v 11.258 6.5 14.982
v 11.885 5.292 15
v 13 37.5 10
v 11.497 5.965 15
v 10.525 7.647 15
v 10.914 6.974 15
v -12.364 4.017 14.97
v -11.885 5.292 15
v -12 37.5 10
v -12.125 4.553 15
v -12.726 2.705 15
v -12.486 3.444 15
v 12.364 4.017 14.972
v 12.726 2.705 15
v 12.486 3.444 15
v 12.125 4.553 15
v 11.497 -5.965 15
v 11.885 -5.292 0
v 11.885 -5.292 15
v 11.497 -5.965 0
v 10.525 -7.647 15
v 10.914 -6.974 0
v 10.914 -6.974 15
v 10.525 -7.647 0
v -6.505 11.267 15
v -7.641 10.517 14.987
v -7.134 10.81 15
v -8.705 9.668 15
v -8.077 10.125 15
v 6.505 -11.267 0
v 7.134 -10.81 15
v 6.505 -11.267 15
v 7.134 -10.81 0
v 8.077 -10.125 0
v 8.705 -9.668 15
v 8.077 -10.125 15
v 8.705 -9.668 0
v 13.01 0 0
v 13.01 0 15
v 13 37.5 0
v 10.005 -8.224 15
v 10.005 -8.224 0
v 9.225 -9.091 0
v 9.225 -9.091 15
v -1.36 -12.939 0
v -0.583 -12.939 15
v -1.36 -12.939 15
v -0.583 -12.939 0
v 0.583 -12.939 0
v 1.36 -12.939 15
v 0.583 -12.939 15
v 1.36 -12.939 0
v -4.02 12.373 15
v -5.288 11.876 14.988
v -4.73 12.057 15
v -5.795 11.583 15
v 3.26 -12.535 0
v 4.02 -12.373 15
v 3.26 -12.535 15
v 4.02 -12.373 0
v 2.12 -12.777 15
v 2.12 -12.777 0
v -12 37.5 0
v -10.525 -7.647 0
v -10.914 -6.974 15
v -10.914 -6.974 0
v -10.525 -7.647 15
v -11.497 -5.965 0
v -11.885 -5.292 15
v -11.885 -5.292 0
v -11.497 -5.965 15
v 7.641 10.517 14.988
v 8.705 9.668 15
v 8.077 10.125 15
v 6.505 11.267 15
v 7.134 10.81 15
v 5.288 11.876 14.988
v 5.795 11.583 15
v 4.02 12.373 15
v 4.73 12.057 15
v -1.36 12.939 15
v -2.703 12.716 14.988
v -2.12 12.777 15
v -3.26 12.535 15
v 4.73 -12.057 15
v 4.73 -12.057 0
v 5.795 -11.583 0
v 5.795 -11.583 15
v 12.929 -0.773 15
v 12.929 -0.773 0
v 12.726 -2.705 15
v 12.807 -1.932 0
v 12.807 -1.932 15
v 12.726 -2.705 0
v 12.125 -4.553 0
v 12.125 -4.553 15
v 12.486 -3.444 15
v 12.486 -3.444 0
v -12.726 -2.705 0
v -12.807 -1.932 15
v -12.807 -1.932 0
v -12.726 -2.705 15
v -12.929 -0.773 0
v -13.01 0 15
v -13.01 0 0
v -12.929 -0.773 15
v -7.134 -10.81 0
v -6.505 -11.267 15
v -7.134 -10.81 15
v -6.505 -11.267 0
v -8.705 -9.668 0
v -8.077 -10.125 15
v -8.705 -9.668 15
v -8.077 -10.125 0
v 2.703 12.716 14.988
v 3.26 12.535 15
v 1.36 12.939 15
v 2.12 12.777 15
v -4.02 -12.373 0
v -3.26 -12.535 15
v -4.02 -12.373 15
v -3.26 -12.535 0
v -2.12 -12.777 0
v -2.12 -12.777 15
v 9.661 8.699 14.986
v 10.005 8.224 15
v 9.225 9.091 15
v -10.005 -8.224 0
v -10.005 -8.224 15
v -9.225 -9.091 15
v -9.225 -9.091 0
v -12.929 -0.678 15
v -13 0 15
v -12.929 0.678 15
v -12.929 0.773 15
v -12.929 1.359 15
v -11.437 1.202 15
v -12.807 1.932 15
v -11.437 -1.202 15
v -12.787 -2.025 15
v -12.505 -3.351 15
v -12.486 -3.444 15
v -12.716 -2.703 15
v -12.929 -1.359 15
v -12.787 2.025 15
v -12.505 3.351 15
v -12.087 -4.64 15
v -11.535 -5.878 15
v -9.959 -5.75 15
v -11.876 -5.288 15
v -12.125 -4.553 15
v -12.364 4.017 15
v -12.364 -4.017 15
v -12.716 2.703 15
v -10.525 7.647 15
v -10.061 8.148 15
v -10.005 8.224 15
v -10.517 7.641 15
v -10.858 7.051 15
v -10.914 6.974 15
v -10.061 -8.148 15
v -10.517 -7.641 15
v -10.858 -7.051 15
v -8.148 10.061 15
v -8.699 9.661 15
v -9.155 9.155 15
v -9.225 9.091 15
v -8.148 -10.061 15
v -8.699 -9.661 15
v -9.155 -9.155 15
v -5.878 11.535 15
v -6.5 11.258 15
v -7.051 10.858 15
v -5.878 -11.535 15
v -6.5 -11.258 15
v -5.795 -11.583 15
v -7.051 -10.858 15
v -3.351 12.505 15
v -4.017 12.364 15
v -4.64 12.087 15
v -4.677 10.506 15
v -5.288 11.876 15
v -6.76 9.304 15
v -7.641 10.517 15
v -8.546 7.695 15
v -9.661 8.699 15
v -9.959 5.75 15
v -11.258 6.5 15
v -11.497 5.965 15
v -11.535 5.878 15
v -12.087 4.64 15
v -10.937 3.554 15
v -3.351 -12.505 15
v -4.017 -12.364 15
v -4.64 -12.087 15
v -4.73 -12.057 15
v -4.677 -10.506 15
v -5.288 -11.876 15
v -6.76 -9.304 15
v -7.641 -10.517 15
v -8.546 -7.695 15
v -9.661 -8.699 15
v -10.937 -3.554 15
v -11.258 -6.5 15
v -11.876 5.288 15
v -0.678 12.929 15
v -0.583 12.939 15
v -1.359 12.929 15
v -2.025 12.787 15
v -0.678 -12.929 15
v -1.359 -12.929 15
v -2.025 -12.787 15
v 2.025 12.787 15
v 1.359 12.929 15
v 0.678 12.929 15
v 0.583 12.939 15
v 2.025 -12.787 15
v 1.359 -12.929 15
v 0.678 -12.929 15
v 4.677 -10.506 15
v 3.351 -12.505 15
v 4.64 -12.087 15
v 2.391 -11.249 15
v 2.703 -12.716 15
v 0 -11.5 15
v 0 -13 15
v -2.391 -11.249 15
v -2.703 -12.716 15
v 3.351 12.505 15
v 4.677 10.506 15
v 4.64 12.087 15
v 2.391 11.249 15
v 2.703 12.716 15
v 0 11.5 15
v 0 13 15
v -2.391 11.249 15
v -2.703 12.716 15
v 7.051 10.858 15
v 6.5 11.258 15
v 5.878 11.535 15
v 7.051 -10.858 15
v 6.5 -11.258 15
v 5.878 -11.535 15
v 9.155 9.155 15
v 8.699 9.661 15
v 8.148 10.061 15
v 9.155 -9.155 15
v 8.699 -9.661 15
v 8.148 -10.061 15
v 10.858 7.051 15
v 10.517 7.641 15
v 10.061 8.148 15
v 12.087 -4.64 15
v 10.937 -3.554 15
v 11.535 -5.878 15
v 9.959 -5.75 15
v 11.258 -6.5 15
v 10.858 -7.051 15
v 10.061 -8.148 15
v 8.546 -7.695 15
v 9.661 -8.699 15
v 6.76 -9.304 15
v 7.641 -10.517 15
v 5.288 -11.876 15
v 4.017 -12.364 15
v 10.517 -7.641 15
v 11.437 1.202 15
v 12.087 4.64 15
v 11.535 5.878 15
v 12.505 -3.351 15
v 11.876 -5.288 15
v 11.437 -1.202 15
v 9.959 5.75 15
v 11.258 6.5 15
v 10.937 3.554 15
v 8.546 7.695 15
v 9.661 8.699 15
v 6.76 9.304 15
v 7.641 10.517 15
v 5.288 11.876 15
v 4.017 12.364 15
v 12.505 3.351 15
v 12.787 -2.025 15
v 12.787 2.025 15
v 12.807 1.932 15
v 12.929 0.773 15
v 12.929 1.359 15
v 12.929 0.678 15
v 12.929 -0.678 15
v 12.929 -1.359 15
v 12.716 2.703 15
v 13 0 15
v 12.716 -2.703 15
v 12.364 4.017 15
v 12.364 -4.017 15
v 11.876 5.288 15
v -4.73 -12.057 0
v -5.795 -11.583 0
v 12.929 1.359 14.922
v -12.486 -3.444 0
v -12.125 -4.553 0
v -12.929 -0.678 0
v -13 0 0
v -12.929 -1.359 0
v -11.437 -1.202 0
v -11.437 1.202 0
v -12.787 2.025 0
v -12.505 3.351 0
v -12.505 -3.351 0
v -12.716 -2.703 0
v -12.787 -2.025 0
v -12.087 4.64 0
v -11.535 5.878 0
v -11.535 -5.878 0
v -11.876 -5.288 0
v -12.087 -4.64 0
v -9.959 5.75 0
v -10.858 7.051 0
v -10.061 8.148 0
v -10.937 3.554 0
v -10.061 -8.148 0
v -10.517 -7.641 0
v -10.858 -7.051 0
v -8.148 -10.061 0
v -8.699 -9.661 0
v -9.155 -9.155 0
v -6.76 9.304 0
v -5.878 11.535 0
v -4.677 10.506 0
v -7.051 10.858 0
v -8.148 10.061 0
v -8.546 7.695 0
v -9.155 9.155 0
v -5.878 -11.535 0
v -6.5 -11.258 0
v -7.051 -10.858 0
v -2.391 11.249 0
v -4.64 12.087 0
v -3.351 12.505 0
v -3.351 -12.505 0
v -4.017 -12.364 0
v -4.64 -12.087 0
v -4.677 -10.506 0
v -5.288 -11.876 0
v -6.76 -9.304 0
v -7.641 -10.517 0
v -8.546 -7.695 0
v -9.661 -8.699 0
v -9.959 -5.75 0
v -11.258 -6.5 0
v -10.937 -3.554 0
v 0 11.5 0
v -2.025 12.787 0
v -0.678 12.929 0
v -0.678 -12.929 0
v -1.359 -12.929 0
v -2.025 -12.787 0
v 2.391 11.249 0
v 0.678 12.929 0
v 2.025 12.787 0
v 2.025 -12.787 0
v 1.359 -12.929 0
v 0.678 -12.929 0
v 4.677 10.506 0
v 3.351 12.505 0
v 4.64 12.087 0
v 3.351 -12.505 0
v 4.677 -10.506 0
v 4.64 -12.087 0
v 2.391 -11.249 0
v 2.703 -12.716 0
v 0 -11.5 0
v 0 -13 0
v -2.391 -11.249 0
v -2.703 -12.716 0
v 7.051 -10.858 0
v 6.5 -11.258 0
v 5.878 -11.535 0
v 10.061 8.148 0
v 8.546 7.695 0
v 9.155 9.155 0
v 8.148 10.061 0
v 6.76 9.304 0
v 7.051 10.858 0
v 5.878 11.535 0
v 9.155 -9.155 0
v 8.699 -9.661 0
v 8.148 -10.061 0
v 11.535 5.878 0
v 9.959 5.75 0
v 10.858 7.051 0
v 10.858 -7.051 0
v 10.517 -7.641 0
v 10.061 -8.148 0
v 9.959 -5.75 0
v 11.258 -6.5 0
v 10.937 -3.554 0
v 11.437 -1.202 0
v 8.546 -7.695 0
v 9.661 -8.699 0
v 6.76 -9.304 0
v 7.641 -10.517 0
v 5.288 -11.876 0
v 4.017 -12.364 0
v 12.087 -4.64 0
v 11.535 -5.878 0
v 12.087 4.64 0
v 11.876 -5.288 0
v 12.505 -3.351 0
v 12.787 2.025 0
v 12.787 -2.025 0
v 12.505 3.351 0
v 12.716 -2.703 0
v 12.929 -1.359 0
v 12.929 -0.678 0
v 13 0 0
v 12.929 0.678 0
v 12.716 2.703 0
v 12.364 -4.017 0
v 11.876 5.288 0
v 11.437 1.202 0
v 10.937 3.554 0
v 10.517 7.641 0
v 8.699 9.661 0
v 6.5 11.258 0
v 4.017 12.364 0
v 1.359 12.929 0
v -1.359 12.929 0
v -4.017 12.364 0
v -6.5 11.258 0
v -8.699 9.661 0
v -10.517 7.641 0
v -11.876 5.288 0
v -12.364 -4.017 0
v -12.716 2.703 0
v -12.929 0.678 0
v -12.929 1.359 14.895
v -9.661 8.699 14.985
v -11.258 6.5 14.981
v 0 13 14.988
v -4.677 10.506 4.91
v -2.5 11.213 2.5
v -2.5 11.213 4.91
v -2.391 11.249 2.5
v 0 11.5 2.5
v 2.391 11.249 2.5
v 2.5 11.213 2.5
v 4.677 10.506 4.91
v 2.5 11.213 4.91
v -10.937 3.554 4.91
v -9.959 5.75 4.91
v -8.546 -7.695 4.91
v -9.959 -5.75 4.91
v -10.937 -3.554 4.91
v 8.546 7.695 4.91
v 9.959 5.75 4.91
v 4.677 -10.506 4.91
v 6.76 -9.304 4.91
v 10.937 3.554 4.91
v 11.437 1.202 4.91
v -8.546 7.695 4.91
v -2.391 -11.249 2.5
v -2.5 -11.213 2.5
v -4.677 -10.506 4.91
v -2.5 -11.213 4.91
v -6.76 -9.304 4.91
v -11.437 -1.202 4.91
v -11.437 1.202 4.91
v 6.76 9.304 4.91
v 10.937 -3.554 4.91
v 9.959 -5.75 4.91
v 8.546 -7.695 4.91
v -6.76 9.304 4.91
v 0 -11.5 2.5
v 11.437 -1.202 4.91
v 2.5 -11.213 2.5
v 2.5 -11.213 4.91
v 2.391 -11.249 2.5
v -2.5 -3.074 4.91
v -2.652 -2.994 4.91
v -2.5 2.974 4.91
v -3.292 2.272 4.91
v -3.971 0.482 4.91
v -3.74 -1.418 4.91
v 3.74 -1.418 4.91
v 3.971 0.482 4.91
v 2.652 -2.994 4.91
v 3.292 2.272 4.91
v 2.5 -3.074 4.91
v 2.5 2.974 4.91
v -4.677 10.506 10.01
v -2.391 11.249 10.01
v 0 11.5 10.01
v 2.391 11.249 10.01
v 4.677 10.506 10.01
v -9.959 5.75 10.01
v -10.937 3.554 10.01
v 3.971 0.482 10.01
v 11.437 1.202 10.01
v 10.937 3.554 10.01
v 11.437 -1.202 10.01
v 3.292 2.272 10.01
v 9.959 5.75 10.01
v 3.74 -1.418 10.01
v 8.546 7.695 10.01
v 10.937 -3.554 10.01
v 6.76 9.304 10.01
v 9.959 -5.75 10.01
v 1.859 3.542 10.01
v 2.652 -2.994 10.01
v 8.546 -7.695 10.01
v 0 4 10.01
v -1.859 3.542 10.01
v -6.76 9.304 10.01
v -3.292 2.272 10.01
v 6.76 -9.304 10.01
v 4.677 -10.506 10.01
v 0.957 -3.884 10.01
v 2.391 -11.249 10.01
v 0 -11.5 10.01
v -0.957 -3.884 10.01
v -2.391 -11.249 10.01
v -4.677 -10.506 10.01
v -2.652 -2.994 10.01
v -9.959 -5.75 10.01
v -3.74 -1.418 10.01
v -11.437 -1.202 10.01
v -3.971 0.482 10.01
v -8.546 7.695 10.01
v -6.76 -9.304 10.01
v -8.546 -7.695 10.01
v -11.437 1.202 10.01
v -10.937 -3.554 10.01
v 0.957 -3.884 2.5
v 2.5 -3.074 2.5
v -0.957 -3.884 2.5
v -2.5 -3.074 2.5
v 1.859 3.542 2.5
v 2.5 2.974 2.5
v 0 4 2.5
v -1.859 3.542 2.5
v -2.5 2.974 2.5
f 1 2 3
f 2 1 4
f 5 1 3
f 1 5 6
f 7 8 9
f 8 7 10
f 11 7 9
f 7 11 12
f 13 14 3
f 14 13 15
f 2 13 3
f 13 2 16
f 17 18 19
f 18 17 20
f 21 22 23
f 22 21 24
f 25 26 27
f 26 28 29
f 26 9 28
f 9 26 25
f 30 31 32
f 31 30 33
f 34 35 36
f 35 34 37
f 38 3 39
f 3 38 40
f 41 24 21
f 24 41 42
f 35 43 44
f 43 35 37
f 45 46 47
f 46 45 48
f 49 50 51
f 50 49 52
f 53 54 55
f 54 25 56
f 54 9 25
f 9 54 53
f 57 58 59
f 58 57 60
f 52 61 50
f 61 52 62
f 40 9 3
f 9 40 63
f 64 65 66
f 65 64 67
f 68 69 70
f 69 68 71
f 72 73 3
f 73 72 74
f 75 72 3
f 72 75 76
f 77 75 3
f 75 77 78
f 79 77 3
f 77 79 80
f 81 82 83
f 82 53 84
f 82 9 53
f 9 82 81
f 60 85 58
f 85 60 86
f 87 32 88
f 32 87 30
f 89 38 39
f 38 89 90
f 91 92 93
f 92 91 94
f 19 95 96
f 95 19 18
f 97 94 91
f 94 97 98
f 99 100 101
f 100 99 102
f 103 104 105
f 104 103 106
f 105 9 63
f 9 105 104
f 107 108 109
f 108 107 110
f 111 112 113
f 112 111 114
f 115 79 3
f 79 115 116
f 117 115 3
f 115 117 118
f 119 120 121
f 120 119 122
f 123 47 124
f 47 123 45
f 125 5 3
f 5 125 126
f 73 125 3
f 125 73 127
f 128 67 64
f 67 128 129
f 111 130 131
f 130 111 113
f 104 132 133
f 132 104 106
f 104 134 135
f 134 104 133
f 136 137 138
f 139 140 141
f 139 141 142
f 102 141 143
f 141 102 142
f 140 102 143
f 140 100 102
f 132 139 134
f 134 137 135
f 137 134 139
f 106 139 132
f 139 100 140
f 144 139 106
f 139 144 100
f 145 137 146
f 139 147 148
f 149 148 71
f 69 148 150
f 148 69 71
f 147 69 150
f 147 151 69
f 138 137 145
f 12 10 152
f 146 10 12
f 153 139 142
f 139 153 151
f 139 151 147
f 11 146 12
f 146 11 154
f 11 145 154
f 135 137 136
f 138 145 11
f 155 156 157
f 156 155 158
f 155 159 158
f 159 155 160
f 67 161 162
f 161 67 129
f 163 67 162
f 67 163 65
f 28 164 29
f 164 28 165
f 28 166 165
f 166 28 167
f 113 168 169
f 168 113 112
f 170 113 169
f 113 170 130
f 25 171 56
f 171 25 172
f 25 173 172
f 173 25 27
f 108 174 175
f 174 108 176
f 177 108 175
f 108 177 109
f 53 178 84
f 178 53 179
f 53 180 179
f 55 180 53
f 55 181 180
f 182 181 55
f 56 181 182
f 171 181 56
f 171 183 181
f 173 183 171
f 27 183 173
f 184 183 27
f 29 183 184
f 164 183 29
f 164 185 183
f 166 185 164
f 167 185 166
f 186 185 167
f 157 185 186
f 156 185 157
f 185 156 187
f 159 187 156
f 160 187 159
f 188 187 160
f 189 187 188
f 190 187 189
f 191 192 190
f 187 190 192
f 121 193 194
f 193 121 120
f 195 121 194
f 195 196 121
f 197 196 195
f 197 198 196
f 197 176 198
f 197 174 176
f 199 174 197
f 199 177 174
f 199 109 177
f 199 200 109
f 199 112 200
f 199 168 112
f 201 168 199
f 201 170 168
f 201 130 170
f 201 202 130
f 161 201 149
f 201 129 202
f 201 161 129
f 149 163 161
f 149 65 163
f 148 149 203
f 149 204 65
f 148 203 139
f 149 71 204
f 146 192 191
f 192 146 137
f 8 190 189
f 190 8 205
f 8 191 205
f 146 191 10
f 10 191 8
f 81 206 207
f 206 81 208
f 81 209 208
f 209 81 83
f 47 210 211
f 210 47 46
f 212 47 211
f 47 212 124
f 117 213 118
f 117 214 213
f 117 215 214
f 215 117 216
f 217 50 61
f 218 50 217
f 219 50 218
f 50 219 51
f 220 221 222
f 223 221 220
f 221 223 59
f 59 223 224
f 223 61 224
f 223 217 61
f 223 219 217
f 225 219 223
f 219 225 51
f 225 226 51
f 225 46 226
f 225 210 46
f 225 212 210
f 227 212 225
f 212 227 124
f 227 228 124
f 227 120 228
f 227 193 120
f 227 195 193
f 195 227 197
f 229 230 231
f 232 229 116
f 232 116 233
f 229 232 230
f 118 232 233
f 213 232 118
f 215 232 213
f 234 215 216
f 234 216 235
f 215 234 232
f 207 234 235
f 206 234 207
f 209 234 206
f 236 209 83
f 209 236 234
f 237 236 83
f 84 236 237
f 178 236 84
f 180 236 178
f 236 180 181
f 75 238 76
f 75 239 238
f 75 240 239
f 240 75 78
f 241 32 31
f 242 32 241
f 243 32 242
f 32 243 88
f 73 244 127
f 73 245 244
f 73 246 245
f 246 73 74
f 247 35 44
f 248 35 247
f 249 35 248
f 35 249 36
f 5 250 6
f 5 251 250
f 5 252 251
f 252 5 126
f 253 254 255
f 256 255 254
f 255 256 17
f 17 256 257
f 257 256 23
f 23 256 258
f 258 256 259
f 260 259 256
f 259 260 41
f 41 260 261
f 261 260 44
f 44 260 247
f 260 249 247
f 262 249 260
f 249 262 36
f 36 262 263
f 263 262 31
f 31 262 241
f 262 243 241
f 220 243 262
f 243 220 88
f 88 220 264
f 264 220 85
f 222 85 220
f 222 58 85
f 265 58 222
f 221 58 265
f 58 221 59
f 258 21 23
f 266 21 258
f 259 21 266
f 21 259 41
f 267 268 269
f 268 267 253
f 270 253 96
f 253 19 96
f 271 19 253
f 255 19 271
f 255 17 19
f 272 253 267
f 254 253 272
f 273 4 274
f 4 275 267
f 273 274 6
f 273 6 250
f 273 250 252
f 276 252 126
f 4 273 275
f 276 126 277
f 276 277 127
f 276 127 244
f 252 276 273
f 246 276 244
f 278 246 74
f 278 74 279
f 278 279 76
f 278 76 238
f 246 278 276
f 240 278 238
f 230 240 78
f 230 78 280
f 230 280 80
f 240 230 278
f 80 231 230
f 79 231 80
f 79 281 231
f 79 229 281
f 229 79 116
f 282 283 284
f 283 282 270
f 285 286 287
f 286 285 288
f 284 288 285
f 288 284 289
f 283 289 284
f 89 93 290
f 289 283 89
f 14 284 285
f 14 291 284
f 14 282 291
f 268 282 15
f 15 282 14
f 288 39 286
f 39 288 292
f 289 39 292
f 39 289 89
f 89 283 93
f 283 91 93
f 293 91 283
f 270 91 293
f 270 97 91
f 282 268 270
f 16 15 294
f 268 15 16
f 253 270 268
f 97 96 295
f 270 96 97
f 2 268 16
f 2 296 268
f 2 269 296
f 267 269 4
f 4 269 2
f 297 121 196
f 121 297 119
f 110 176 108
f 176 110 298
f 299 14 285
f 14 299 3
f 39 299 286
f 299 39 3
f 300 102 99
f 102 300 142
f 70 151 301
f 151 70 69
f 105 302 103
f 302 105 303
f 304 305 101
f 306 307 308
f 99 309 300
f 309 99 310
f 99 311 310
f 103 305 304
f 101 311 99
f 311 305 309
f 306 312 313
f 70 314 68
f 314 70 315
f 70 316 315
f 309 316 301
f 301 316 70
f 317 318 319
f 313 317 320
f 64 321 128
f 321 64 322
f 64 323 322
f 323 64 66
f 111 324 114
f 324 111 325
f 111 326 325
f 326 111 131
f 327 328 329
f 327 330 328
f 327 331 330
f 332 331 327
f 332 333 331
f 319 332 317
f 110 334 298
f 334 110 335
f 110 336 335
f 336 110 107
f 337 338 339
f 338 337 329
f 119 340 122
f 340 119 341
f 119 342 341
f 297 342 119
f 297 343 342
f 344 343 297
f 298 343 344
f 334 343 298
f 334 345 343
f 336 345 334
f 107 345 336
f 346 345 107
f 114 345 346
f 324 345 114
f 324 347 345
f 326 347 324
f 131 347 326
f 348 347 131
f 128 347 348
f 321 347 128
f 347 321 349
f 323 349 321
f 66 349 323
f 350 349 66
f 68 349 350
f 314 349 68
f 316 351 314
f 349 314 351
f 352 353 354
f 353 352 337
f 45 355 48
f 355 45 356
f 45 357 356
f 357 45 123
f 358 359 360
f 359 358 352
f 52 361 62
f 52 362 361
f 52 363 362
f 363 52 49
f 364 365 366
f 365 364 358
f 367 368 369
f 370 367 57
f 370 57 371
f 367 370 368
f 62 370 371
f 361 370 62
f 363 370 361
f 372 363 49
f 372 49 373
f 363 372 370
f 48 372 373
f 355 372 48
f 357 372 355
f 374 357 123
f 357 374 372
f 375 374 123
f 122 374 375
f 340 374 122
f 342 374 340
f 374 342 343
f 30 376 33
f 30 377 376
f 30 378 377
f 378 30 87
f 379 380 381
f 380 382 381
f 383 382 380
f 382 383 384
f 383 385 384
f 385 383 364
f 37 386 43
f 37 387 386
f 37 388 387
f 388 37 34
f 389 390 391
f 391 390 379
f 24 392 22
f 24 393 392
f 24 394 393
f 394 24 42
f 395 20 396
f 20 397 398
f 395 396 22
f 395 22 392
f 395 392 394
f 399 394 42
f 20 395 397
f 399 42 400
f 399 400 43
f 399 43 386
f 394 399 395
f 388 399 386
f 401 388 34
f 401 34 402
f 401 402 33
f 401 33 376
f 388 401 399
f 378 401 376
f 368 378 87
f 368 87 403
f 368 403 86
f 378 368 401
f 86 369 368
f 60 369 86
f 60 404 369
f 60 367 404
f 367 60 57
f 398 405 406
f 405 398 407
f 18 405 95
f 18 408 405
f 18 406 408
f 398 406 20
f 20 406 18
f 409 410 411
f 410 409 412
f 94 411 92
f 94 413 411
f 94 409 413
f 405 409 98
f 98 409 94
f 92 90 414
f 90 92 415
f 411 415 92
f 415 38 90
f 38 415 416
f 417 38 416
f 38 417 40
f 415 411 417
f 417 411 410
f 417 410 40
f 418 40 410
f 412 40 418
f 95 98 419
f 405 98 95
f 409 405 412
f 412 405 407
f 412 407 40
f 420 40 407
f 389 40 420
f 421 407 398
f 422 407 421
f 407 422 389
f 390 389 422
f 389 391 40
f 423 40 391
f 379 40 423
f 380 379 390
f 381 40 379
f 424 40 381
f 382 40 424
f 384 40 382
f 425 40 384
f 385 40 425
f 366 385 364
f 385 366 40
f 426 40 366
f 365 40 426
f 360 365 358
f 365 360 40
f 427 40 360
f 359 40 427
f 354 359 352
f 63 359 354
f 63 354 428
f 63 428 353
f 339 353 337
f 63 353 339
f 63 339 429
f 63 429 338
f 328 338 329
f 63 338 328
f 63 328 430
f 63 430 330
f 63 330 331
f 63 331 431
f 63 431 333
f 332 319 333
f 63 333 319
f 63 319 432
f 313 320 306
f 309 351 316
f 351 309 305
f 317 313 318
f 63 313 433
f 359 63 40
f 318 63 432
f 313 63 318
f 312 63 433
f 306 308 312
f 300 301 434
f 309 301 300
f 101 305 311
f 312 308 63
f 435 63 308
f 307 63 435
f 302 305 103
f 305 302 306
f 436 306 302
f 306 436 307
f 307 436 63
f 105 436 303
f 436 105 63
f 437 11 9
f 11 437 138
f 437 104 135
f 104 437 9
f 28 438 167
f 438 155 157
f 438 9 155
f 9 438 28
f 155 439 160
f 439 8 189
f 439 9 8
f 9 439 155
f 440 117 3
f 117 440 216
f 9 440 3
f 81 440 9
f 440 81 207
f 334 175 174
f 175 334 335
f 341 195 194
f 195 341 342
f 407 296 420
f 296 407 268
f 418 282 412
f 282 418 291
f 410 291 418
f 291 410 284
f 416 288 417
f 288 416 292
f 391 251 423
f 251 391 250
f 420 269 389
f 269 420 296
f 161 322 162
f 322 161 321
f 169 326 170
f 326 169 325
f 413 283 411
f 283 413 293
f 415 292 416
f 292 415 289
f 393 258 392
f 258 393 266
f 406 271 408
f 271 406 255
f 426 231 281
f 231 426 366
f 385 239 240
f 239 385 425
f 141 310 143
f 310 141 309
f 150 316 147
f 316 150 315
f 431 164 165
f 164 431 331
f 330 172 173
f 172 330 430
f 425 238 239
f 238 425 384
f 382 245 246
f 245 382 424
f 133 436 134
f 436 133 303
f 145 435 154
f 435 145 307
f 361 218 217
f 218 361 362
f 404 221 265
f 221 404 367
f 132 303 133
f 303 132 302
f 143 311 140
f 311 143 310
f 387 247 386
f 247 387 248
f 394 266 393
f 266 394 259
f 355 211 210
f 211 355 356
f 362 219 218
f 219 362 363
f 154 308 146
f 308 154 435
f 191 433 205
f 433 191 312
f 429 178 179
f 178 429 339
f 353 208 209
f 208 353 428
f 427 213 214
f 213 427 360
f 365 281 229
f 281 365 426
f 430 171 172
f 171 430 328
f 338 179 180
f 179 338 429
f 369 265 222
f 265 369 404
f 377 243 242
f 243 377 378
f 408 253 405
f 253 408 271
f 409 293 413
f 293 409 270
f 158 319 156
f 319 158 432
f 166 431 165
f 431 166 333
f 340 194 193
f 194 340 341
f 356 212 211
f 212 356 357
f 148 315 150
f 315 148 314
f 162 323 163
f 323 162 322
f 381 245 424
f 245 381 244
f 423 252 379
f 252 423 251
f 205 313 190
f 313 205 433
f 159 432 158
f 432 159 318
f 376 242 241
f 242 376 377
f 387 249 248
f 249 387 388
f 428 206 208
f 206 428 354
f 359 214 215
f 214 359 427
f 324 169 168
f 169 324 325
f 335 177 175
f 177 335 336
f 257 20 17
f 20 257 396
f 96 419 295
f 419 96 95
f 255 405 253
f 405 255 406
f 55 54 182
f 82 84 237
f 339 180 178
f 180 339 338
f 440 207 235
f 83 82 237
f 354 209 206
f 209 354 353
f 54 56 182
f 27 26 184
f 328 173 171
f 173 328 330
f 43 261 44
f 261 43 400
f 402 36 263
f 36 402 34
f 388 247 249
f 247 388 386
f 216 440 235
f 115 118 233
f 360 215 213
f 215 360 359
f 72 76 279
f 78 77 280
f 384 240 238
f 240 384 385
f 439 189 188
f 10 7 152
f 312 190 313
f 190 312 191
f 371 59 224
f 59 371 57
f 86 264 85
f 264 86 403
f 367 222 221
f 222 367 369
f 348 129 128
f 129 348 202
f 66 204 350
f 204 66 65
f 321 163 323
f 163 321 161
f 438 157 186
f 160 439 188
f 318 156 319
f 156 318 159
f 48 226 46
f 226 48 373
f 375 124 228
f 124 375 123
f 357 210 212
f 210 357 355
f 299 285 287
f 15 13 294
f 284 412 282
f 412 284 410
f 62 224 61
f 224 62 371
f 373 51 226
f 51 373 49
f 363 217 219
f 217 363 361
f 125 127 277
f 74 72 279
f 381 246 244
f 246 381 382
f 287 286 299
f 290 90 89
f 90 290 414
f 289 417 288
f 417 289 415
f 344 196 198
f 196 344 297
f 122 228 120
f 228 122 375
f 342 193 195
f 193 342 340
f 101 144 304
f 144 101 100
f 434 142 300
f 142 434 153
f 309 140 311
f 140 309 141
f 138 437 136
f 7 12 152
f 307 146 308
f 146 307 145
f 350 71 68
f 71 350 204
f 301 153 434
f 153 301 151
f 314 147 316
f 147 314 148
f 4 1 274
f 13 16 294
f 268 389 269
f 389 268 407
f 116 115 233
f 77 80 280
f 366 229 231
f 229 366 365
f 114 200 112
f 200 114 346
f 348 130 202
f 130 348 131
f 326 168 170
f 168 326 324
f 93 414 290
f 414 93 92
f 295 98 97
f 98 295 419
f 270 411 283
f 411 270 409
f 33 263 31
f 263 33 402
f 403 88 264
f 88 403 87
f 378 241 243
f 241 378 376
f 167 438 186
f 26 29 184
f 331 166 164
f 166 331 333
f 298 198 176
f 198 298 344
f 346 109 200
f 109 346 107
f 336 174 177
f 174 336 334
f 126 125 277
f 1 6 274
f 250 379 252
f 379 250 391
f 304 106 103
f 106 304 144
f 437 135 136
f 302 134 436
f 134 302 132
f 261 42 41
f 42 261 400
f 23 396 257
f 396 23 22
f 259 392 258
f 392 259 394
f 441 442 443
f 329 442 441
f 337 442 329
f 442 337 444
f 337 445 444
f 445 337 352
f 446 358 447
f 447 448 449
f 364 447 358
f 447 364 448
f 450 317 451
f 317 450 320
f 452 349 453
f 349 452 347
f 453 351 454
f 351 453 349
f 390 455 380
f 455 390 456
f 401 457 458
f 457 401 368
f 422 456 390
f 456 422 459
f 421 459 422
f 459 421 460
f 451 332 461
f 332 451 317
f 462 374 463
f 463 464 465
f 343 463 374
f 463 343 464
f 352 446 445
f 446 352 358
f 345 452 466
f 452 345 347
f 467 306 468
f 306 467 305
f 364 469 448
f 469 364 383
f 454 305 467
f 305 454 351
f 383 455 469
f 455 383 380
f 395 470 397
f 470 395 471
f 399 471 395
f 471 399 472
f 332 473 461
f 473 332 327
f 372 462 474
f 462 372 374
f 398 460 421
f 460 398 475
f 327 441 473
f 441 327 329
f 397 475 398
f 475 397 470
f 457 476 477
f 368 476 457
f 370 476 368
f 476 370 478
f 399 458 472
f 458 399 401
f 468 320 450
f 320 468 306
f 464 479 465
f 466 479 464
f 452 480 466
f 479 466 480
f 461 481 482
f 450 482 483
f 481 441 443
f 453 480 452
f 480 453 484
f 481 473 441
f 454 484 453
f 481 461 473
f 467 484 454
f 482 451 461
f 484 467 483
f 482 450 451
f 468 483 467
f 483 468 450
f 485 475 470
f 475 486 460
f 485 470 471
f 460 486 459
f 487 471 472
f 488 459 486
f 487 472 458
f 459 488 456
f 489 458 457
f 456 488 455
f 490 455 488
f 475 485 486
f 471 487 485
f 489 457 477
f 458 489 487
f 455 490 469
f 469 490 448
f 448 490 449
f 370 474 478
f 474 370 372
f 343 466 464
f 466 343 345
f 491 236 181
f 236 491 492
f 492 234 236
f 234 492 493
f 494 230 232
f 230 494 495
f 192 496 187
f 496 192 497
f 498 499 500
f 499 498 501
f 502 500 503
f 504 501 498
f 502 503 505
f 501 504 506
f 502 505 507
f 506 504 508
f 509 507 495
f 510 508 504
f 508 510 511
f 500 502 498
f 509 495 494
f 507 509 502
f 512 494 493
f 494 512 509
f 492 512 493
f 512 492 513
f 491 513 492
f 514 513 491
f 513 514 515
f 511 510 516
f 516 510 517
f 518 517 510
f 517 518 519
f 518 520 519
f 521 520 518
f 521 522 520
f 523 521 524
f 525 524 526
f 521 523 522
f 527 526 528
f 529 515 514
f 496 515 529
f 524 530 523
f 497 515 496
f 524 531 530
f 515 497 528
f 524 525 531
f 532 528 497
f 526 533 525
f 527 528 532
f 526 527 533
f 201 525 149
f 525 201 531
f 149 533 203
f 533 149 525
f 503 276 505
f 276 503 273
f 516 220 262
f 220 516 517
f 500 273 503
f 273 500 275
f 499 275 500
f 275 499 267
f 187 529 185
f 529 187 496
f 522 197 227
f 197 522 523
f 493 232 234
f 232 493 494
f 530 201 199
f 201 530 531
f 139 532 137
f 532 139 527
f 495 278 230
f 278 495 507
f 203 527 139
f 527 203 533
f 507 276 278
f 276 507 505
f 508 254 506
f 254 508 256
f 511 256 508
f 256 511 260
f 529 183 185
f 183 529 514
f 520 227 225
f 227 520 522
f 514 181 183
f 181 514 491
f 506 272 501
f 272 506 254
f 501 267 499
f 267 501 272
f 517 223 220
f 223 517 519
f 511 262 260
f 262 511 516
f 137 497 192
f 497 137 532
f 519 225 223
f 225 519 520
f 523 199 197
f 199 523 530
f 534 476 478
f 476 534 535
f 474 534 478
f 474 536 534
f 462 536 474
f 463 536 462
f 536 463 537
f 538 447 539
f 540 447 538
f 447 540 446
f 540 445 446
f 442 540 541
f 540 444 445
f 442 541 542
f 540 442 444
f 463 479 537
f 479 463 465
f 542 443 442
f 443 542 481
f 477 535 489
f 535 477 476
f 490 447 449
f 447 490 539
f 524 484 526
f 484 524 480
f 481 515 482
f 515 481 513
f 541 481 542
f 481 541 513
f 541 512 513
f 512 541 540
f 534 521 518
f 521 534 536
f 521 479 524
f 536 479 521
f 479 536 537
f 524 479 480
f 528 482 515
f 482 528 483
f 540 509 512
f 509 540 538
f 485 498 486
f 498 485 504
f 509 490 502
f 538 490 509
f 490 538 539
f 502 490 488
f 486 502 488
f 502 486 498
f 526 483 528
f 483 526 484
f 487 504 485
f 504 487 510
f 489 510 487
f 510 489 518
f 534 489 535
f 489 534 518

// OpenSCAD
//include <threads.scad>;

connectorRadius = 26/2;
connectorHeight = 15;

module connector () {
		insetDepth = 5;
		insetRadius = 23/2;
		slotWidth = 5;
		slotHeight = 2.5;
		difference() {
				union() {
						// this is the locking key
						translate([0, 0, insetDepth - slotHeight/2]) 
							cube([(connectorRadius * 2) - 0.7, 
									slotWidth, slotHeight], 
									center = true);

						difference() {
								difference() {
										cylinder(r = connectorRadius, h = connectorHeight);
										// bottom inset
										translate([0,0,-0.1]) 
											cylinder(r = insetRadius, h = insetDepth + 0.01);
								}
										// top inset
										translate([0,0,connectorHeight - insetDepth + 0.01])
											cylinder(r = insetRadius, h = insetDepth + 0.02);
						}
				}
			translate([0,0, -0.01]) cylinder(r = 4, h = connectorHeight + 0.01);		
		}
}

union() {
	difference() {
			hull() {
					cylinder(r = connectorRadius + 0.01, 
								 h = connectorHeight);
					translate([0.5, 25, 5]) cube([25, 25, 10], center = true);
			}
			translate([0, 0, -0.1])
			cylinder(r = connectorRadius, 
					 h = connectorHeight + 0.2);
	}
	//translate([0,0,-0.1])
		rotate([0,0,90]) connector();
}
